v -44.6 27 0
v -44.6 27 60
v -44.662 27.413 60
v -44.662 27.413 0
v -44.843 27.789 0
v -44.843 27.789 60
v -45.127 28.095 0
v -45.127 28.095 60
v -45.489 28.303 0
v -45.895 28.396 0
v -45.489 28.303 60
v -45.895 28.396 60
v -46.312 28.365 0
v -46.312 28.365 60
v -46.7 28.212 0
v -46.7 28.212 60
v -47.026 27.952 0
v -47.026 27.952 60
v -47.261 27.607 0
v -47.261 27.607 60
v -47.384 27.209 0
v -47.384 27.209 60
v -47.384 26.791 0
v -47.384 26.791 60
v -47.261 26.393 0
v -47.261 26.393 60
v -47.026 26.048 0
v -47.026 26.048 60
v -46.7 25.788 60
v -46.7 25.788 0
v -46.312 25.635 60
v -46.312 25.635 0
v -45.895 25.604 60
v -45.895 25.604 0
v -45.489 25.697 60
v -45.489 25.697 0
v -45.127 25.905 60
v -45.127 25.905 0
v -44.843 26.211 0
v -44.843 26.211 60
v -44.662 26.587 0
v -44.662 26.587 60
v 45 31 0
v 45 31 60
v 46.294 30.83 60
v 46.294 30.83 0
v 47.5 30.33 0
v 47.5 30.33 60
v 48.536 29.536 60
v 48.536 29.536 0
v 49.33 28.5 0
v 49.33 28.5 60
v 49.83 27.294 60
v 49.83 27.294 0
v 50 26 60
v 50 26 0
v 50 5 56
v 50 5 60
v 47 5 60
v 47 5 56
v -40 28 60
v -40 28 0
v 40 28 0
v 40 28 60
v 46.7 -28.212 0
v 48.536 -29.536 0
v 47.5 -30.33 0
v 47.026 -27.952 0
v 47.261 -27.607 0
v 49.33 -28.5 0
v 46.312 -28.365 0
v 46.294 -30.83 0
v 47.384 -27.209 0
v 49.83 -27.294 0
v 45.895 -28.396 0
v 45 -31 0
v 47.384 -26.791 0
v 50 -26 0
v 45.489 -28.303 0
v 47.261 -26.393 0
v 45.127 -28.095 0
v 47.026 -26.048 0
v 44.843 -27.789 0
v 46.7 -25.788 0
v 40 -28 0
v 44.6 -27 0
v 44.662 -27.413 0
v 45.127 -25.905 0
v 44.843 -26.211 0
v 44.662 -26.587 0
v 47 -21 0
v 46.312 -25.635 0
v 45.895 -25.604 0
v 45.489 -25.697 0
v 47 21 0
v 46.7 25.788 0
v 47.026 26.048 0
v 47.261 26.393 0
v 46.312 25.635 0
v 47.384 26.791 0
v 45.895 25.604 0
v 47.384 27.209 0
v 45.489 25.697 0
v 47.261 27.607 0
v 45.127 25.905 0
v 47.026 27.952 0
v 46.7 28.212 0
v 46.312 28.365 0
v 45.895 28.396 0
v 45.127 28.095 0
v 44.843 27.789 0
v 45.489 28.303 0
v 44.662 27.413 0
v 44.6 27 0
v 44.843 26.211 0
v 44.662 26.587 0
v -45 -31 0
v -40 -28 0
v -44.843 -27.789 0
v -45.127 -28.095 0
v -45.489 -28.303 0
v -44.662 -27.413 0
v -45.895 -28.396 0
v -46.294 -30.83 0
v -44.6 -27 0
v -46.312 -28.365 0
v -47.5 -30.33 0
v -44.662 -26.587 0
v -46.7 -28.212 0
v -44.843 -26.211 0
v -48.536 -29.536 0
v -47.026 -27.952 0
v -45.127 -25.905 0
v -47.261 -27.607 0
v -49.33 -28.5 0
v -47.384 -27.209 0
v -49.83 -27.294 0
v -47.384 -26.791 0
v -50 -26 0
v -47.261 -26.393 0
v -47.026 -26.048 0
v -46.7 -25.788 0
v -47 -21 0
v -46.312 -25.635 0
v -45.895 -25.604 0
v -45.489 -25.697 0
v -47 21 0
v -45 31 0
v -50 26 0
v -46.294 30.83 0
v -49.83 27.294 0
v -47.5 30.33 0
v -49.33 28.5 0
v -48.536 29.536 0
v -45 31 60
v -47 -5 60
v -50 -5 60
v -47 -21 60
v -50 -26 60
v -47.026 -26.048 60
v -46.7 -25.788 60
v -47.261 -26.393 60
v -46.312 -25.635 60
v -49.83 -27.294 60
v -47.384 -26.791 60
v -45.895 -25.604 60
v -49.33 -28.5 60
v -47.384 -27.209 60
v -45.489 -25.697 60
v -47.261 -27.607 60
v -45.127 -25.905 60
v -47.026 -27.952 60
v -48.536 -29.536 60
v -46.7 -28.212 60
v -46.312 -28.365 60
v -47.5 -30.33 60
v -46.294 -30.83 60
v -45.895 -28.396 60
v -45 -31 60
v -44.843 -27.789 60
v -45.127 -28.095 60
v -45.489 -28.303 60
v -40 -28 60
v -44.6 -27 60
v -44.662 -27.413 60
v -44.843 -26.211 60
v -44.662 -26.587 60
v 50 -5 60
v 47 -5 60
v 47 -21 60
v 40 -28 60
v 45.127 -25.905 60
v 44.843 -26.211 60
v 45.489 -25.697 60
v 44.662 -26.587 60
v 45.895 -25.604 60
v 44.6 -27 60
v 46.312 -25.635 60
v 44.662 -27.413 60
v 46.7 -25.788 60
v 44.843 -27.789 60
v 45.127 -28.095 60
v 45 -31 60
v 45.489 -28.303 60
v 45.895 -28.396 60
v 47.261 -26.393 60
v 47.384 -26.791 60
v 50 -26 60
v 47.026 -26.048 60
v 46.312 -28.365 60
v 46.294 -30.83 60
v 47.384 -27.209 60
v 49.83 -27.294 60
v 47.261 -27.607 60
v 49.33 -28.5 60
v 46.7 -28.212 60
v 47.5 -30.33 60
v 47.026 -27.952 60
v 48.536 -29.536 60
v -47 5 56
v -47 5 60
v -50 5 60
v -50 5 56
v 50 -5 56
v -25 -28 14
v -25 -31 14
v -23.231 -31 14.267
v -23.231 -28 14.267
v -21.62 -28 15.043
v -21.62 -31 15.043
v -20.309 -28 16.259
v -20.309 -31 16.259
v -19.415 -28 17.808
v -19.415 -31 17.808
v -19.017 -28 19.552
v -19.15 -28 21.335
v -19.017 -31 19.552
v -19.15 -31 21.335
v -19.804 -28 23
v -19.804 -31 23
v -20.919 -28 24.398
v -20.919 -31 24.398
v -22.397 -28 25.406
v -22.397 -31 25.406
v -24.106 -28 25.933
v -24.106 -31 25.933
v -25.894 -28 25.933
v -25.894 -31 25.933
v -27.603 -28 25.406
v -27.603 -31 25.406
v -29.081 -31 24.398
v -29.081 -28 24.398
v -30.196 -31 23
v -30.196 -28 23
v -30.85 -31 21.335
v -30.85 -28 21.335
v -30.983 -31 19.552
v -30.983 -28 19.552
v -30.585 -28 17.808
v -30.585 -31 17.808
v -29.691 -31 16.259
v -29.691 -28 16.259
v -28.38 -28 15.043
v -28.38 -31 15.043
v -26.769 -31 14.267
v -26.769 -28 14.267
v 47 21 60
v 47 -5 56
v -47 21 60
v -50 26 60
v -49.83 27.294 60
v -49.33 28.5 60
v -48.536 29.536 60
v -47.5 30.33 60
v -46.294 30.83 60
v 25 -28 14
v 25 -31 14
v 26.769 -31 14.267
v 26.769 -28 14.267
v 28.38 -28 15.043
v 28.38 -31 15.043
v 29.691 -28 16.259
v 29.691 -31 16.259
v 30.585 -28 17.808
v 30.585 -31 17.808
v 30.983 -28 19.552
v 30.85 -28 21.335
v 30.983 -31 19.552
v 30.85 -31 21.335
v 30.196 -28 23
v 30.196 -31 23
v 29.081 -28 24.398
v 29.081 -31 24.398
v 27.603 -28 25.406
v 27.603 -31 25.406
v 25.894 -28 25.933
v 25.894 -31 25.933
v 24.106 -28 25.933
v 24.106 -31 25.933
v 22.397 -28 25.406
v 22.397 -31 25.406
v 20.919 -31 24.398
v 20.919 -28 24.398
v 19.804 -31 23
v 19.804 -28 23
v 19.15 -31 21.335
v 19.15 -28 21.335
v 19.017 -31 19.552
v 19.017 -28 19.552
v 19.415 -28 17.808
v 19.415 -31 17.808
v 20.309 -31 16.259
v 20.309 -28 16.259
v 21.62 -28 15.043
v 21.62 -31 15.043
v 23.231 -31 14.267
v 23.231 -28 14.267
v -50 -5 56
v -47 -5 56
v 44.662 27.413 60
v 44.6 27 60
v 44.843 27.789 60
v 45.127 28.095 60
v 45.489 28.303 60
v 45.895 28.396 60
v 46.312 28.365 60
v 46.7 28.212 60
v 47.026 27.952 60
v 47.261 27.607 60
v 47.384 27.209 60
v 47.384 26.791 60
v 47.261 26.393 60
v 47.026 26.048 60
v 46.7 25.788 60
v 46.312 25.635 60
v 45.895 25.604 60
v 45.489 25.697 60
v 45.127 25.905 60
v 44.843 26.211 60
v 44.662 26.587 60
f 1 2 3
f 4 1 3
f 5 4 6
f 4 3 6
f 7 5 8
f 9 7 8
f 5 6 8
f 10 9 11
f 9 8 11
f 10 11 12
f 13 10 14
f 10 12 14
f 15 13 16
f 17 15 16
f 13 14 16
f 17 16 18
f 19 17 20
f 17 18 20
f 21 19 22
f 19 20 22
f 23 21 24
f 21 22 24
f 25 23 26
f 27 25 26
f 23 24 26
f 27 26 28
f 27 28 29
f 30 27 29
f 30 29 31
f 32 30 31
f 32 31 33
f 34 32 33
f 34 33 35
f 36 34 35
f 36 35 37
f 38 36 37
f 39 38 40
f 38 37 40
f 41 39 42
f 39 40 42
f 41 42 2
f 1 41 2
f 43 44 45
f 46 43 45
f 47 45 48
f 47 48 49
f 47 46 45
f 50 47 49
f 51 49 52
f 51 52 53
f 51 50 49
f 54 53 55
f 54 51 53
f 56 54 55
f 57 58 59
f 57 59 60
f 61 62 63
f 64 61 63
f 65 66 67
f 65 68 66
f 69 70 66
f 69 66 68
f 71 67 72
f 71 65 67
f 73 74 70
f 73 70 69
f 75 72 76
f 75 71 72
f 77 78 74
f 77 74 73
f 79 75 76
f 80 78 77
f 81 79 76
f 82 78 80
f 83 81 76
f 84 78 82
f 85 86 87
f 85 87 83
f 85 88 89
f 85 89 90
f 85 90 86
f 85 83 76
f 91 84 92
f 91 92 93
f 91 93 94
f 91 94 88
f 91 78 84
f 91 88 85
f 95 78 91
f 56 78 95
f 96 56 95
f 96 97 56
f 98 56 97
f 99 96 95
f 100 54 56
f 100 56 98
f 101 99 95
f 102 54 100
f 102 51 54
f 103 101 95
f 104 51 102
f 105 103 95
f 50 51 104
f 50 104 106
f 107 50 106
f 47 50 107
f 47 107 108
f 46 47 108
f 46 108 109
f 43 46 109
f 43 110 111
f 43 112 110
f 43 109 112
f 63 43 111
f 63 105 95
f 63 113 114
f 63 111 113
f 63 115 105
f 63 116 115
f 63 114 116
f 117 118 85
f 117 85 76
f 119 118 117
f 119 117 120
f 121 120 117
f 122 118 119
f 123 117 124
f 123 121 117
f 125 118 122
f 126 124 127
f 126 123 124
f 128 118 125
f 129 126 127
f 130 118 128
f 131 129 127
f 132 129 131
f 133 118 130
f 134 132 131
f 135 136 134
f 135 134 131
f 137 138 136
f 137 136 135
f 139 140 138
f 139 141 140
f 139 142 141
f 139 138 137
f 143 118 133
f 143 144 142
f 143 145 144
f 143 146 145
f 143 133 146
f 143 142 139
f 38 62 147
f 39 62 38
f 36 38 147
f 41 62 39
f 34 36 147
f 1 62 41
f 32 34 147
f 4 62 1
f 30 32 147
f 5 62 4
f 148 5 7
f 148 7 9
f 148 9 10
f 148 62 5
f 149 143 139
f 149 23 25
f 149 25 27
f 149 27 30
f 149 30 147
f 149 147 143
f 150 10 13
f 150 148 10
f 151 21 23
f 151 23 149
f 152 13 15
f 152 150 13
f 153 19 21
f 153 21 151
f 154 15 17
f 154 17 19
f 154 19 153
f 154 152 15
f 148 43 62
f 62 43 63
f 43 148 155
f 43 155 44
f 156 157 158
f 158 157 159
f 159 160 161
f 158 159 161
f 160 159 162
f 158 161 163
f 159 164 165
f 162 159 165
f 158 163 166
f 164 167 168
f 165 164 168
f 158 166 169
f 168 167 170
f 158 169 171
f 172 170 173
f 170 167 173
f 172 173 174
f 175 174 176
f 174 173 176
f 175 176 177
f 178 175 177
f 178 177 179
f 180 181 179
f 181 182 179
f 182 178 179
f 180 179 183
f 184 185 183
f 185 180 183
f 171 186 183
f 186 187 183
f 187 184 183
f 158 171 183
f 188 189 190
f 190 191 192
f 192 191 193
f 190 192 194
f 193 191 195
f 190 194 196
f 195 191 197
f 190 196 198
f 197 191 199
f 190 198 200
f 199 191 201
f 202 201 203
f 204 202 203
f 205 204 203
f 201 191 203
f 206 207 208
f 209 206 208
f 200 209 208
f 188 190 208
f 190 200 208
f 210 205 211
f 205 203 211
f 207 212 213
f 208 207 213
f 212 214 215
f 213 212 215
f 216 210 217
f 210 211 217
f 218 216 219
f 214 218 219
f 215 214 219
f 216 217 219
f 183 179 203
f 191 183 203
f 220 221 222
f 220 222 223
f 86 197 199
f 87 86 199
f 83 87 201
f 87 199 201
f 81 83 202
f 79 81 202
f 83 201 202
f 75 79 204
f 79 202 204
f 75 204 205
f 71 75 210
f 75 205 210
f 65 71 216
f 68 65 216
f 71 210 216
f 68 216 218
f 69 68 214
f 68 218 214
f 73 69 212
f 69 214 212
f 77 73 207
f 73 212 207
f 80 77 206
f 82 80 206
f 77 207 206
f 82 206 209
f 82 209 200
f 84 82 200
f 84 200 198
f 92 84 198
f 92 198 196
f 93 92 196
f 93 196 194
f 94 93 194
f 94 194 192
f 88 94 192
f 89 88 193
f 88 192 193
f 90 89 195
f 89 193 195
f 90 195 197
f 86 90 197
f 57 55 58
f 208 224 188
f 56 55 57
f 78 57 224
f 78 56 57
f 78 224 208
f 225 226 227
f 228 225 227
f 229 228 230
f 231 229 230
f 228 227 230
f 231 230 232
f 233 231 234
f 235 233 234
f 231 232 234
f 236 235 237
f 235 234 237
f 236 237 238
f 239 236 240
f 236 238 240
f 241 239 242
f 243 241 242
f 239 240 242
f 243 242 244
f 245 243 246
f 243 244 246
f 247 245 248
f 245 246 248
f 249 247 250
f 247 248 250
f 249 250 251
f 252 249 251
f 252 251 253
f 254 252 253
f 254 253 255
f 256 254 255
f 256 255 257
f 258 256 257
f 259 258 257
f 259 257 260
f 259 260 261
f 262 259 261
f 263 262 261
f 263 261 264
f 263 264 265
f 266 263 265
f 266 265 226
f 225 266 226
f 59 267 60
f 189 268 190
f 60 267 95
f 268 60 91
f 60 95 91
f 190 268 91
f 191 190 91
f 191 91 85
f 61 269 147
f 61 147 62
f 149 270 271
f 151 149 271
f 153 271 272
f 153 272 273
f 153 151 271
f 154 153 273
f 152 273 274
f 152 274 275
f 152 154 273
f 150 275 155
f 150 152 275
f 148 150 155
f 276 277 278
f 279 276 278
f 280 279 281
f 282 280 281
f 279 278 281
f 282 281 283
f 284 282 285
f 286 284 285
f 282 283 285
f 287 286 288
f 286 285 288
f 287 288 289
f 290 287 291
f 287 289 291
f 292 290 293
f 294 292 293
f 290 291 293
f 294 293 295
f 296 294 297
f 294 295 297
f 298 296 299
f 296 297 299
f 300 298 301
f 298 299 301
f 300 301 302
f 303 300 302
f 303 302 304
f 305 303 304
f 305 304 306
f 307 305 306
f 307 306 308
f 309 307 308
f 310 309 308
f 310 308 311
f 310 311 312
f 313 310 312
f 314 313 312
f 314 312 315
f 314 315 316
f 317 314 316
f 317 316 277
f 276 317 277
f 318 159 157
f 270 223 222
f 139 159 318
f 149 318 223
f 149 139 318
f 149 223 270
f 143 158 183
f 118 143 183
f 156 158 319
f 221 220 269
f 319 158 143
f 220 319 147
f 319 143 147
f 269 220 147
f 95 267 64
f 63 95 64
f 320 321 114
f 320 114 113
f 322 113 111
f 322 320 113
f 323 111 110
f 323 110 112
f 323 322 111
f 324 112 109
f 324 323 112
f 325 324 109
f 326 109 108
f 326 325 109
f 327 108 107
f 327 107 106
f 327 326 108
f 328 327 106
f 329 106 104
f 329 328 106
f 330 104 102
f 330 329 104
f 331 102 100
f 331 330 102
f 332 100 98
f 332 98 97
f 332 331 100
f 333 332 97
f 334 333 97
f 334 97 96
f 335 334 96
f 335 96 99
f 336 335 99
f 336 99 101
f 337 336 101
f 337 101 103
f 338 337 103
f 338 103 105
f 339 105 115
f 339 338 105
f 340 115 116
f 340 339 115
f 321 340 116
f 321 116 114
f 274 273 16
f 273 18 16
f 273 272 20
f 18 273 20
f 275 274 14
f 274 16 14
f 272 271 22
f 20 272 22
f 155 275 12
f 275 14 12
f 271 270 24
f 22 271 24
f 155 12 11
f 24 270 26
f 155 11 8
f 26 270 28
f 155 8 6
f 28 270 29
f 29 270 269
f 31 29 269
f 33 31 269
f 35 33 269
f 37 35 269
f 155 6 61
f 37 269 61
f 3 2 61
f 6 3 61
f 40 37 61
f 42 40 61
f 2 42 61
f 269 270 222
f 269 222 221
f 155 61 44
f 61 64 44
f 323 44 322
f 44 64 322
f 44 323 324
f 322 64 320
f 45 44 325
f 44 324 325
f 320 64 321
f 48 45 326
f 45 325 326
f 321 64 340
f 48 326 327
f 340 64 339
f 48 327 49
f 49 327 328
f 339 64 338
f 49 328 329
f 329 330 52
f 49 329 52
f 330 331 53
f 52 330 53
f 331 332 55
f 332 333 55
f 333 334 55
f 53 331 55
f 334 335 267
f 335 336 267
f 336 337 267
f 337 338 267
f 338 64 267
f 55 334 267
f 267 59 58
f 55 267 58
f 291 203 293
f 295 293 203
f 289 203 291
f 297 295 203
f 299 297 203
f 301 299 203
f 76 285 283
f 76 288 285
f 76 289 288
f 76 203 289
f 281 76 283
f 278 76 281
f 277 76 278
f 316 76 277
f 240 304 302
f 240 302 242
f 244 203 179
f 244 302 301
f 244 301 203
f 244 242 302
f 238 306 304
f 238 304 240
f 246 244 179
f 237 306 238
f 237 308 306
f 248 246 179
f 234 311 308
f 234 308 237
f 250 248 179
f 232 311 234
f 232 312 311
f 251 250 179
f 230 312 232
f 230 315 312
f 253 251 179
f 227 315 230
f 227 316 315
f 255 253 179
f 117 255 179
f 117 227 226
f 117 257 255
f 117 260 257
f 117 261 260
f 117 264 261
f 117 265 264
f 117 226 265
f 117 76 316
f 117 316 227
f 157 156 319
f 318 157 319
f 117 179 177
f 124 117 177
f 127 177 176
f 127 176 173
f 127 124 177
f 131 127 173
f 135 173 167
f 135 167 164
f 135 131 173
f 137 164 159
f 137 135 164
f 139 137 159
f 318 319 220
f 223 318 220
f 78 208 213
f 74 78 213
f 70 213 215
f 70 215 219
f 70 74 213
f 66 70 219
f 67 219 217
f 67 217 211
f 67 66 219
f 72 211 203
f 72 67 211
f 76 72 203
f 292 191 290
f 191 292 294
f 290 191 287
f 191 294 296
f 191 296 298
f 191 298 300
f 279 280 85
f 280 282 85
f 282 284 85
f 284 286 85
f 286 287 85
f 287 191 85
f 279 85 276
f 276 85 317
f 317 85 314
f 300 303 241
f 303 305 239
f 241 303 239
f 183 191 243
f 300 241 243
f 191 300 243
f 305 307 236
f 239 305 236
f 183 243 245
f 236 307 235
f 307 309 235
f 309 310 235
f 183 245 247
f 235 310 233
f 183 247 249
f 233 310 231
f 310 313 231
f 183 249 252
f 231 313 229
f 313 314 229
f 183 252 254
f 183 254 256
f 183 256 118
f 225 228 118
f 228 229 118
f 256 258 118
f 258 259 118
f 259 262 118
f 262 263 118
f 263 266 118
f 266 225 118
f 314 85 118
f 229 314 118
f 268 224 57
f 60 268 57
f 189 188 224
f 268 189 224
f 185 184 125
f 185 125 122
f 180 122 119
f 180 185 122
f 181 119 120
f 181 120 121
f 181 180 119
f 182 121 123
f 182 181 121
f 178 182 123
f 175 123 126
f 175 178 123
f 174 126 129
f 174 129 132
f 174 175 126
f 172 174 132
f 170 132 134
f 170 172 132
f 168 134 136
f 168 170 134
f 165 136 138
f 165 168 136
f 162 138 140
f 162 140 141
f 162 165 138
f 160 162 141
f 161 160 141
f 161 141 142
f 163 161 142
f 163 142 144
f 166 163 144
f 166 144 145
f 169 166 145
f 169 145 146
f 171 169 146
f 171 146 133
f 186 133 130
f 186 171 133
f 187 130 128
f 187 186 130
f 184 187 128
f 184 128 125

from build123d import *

# Parameters (mm, degrees)
EXTRUDE_1_DEPTH          = 60
EXTRUDE_2_DEPTH          = 60
SKETCH_4_R               = 1.4
CUT_EXTRUDE_1_DEPTH      = 60
MIRROR_2_COPY_1_DEPTH    = 60
MIRROR_2_COPY_2_SKETCH_R = 1.4
MIRROR_2_COPY_2_DEPTH    = 60
SKETCH_7_R               = 6
CUT_EXTRUDE_3_DEPTH      = 10
SKETCH_8_W               = 4
SKETCH_8_H               = 10
CUT_EXTRUDE_4_DEPTH      = 100


with BuildPart() as part:
    # 草图1 → 凸台-拉伸1 (new body)
    with BuildSketch(Plane.XY):
        with BuildLine():
            Line((-45, 31), (45, 31))
            ThreePointArc((45, 31), (48.535533906, 29.535533906), (50, 26))
            Line((50, 26), (50, -26))
            ThreePointArc((50, -26), (48.535533906, -29.535533906), (45, -31))
            Line((45, -31), (-45, -31))
            ThreePointArc((-45, -31), (-48.535533906, -29.535533906), (-50, -26))
            Line((-50, -26), (-50, 26))
            ThreePointArc((-50, 26), (-48.535533906, 29.535533906), (-45, 31))
        make_face()
        with BuildLine():
            Line((-42, 28), (42, 28))
            ThreePointArc((42, 28), (45.535533906, 26.535533906), (47, 23))
            Line((47, 23), (47, -23))
            ThreePointArc((47, -23), (45.535533906, -26.535533906), (42, -28))
            Line((42, -28), (-42, -28))
            ThreePointArc((-42, -28), (-45.535533906, -26.535533906), (-47, -23))
            Line((-47, -23), (-47, 23))
            ThreePointArc((-47, 23), (-45.535533906, 26.535533906), (-42, 28))
        make_face(mode=Mode.SUBTRACT)
    extrude(amount=EXTRUDE_1_DEPTH)

    # 草图3 → 凸台-拉伸2 (add)
    with BuildSketch(Plane.XY.offset(60)):
        Polygon((-47, 28), (-47, 21), (-40, 28), align=None)
    extrude_2 = extrude(amount=-EXTRUDE_2_DEPTH)

    # 草图4 → 切除-拉伸1 (cut)
    with BuildSketch(Plane.XY.offset(60)):
        with Locations((-46, 27)):
            Circle(SKETCH_4_R)
    cut_extrude_1 = extrude(amount=-CUT_EXTRUDE_1_DEPTH, mode=Mode.SUBTRACT)

    # 镜向1: 凸台-拉伸2, 切除-拉伸1 across plane
    add(extrude_2.mirror(Plane(origin=(0, 0, 0), x_dir=(0, 0, 1), z_dir=(1, 0, 0))))
    add(cut_extrude_1.mirror(Plane(origin=(0, 0, 0), x_dir=(0, 0, 1), z_dir=(1, 0, 0))), mode=Mode.SUBTRACT)

    # 镜向2: 凸台-拉伸2, 切除-拉伸1 across plane
    add(extrude_2.mirror(Plane.ZX))
    add(cut_extrude_1.mirror(Plane.ZX), mode=Mode.SUBTRACT)

    # 镜向2 copy 1 sketch → 镜向2 copy 1 (add)
    with BuildSketch(Plane(origin=(0, 0, 60), x_dir=(-1, 0, 0), z_dir=(0, 0, 1))):
        Polygon((-47, 28), (-47, 21), (-40, 28), align=None)
    extrude(amount=-MIRROR_2_COPY_1_DEPTH)

    # 镜向2 copy 2 sketch → 镜向2 copy 2 (cut)
    with BuildSketch(Plane(origin=(0, 0, 60), x_dir=(-1, 0, 0), z_dir=(0, 0, 1))):
        with Locations((-46, 27)):
            Circle(MIRROR_2_COPY_2_SKETCH_R)
    extrude(amount=-MIRROR_2_COPY_2_DEPTH, mode=Mode.SUBTRACT)

    # 草图7 → 切除-拉伸3 (cut)
    with BuildSketch(Plane.XZ.offset(31)):
        with Locations(Location((-25, 20, 0), (0, 0, 270))):
            Circle(SKETCH_7_R)
        with Locations(Location((25, 20, 0), (0, 0, 270))):
            Circle(SKETCH_7_R)
    extrude(amount=-CUT_EXTRUDE_3_DEPTH, mode=Mode.SUBTRACT)

    # 草图8 → 切除-拉伸4 (cut)
    with BuildSketch(Plane(origin=(50, 0, 0), x_dir=(0, 0, -1), z_dir=(1, 0, 0))):
        with Locations((-58, 0)):
            Rectangle(SKETCH_8_W, SKETCH_8_H)
    extrude(amount=-CUT_EXTRUDE_4_DEPTH, mode=Mode.SUBTRACT)


solid = part.part
